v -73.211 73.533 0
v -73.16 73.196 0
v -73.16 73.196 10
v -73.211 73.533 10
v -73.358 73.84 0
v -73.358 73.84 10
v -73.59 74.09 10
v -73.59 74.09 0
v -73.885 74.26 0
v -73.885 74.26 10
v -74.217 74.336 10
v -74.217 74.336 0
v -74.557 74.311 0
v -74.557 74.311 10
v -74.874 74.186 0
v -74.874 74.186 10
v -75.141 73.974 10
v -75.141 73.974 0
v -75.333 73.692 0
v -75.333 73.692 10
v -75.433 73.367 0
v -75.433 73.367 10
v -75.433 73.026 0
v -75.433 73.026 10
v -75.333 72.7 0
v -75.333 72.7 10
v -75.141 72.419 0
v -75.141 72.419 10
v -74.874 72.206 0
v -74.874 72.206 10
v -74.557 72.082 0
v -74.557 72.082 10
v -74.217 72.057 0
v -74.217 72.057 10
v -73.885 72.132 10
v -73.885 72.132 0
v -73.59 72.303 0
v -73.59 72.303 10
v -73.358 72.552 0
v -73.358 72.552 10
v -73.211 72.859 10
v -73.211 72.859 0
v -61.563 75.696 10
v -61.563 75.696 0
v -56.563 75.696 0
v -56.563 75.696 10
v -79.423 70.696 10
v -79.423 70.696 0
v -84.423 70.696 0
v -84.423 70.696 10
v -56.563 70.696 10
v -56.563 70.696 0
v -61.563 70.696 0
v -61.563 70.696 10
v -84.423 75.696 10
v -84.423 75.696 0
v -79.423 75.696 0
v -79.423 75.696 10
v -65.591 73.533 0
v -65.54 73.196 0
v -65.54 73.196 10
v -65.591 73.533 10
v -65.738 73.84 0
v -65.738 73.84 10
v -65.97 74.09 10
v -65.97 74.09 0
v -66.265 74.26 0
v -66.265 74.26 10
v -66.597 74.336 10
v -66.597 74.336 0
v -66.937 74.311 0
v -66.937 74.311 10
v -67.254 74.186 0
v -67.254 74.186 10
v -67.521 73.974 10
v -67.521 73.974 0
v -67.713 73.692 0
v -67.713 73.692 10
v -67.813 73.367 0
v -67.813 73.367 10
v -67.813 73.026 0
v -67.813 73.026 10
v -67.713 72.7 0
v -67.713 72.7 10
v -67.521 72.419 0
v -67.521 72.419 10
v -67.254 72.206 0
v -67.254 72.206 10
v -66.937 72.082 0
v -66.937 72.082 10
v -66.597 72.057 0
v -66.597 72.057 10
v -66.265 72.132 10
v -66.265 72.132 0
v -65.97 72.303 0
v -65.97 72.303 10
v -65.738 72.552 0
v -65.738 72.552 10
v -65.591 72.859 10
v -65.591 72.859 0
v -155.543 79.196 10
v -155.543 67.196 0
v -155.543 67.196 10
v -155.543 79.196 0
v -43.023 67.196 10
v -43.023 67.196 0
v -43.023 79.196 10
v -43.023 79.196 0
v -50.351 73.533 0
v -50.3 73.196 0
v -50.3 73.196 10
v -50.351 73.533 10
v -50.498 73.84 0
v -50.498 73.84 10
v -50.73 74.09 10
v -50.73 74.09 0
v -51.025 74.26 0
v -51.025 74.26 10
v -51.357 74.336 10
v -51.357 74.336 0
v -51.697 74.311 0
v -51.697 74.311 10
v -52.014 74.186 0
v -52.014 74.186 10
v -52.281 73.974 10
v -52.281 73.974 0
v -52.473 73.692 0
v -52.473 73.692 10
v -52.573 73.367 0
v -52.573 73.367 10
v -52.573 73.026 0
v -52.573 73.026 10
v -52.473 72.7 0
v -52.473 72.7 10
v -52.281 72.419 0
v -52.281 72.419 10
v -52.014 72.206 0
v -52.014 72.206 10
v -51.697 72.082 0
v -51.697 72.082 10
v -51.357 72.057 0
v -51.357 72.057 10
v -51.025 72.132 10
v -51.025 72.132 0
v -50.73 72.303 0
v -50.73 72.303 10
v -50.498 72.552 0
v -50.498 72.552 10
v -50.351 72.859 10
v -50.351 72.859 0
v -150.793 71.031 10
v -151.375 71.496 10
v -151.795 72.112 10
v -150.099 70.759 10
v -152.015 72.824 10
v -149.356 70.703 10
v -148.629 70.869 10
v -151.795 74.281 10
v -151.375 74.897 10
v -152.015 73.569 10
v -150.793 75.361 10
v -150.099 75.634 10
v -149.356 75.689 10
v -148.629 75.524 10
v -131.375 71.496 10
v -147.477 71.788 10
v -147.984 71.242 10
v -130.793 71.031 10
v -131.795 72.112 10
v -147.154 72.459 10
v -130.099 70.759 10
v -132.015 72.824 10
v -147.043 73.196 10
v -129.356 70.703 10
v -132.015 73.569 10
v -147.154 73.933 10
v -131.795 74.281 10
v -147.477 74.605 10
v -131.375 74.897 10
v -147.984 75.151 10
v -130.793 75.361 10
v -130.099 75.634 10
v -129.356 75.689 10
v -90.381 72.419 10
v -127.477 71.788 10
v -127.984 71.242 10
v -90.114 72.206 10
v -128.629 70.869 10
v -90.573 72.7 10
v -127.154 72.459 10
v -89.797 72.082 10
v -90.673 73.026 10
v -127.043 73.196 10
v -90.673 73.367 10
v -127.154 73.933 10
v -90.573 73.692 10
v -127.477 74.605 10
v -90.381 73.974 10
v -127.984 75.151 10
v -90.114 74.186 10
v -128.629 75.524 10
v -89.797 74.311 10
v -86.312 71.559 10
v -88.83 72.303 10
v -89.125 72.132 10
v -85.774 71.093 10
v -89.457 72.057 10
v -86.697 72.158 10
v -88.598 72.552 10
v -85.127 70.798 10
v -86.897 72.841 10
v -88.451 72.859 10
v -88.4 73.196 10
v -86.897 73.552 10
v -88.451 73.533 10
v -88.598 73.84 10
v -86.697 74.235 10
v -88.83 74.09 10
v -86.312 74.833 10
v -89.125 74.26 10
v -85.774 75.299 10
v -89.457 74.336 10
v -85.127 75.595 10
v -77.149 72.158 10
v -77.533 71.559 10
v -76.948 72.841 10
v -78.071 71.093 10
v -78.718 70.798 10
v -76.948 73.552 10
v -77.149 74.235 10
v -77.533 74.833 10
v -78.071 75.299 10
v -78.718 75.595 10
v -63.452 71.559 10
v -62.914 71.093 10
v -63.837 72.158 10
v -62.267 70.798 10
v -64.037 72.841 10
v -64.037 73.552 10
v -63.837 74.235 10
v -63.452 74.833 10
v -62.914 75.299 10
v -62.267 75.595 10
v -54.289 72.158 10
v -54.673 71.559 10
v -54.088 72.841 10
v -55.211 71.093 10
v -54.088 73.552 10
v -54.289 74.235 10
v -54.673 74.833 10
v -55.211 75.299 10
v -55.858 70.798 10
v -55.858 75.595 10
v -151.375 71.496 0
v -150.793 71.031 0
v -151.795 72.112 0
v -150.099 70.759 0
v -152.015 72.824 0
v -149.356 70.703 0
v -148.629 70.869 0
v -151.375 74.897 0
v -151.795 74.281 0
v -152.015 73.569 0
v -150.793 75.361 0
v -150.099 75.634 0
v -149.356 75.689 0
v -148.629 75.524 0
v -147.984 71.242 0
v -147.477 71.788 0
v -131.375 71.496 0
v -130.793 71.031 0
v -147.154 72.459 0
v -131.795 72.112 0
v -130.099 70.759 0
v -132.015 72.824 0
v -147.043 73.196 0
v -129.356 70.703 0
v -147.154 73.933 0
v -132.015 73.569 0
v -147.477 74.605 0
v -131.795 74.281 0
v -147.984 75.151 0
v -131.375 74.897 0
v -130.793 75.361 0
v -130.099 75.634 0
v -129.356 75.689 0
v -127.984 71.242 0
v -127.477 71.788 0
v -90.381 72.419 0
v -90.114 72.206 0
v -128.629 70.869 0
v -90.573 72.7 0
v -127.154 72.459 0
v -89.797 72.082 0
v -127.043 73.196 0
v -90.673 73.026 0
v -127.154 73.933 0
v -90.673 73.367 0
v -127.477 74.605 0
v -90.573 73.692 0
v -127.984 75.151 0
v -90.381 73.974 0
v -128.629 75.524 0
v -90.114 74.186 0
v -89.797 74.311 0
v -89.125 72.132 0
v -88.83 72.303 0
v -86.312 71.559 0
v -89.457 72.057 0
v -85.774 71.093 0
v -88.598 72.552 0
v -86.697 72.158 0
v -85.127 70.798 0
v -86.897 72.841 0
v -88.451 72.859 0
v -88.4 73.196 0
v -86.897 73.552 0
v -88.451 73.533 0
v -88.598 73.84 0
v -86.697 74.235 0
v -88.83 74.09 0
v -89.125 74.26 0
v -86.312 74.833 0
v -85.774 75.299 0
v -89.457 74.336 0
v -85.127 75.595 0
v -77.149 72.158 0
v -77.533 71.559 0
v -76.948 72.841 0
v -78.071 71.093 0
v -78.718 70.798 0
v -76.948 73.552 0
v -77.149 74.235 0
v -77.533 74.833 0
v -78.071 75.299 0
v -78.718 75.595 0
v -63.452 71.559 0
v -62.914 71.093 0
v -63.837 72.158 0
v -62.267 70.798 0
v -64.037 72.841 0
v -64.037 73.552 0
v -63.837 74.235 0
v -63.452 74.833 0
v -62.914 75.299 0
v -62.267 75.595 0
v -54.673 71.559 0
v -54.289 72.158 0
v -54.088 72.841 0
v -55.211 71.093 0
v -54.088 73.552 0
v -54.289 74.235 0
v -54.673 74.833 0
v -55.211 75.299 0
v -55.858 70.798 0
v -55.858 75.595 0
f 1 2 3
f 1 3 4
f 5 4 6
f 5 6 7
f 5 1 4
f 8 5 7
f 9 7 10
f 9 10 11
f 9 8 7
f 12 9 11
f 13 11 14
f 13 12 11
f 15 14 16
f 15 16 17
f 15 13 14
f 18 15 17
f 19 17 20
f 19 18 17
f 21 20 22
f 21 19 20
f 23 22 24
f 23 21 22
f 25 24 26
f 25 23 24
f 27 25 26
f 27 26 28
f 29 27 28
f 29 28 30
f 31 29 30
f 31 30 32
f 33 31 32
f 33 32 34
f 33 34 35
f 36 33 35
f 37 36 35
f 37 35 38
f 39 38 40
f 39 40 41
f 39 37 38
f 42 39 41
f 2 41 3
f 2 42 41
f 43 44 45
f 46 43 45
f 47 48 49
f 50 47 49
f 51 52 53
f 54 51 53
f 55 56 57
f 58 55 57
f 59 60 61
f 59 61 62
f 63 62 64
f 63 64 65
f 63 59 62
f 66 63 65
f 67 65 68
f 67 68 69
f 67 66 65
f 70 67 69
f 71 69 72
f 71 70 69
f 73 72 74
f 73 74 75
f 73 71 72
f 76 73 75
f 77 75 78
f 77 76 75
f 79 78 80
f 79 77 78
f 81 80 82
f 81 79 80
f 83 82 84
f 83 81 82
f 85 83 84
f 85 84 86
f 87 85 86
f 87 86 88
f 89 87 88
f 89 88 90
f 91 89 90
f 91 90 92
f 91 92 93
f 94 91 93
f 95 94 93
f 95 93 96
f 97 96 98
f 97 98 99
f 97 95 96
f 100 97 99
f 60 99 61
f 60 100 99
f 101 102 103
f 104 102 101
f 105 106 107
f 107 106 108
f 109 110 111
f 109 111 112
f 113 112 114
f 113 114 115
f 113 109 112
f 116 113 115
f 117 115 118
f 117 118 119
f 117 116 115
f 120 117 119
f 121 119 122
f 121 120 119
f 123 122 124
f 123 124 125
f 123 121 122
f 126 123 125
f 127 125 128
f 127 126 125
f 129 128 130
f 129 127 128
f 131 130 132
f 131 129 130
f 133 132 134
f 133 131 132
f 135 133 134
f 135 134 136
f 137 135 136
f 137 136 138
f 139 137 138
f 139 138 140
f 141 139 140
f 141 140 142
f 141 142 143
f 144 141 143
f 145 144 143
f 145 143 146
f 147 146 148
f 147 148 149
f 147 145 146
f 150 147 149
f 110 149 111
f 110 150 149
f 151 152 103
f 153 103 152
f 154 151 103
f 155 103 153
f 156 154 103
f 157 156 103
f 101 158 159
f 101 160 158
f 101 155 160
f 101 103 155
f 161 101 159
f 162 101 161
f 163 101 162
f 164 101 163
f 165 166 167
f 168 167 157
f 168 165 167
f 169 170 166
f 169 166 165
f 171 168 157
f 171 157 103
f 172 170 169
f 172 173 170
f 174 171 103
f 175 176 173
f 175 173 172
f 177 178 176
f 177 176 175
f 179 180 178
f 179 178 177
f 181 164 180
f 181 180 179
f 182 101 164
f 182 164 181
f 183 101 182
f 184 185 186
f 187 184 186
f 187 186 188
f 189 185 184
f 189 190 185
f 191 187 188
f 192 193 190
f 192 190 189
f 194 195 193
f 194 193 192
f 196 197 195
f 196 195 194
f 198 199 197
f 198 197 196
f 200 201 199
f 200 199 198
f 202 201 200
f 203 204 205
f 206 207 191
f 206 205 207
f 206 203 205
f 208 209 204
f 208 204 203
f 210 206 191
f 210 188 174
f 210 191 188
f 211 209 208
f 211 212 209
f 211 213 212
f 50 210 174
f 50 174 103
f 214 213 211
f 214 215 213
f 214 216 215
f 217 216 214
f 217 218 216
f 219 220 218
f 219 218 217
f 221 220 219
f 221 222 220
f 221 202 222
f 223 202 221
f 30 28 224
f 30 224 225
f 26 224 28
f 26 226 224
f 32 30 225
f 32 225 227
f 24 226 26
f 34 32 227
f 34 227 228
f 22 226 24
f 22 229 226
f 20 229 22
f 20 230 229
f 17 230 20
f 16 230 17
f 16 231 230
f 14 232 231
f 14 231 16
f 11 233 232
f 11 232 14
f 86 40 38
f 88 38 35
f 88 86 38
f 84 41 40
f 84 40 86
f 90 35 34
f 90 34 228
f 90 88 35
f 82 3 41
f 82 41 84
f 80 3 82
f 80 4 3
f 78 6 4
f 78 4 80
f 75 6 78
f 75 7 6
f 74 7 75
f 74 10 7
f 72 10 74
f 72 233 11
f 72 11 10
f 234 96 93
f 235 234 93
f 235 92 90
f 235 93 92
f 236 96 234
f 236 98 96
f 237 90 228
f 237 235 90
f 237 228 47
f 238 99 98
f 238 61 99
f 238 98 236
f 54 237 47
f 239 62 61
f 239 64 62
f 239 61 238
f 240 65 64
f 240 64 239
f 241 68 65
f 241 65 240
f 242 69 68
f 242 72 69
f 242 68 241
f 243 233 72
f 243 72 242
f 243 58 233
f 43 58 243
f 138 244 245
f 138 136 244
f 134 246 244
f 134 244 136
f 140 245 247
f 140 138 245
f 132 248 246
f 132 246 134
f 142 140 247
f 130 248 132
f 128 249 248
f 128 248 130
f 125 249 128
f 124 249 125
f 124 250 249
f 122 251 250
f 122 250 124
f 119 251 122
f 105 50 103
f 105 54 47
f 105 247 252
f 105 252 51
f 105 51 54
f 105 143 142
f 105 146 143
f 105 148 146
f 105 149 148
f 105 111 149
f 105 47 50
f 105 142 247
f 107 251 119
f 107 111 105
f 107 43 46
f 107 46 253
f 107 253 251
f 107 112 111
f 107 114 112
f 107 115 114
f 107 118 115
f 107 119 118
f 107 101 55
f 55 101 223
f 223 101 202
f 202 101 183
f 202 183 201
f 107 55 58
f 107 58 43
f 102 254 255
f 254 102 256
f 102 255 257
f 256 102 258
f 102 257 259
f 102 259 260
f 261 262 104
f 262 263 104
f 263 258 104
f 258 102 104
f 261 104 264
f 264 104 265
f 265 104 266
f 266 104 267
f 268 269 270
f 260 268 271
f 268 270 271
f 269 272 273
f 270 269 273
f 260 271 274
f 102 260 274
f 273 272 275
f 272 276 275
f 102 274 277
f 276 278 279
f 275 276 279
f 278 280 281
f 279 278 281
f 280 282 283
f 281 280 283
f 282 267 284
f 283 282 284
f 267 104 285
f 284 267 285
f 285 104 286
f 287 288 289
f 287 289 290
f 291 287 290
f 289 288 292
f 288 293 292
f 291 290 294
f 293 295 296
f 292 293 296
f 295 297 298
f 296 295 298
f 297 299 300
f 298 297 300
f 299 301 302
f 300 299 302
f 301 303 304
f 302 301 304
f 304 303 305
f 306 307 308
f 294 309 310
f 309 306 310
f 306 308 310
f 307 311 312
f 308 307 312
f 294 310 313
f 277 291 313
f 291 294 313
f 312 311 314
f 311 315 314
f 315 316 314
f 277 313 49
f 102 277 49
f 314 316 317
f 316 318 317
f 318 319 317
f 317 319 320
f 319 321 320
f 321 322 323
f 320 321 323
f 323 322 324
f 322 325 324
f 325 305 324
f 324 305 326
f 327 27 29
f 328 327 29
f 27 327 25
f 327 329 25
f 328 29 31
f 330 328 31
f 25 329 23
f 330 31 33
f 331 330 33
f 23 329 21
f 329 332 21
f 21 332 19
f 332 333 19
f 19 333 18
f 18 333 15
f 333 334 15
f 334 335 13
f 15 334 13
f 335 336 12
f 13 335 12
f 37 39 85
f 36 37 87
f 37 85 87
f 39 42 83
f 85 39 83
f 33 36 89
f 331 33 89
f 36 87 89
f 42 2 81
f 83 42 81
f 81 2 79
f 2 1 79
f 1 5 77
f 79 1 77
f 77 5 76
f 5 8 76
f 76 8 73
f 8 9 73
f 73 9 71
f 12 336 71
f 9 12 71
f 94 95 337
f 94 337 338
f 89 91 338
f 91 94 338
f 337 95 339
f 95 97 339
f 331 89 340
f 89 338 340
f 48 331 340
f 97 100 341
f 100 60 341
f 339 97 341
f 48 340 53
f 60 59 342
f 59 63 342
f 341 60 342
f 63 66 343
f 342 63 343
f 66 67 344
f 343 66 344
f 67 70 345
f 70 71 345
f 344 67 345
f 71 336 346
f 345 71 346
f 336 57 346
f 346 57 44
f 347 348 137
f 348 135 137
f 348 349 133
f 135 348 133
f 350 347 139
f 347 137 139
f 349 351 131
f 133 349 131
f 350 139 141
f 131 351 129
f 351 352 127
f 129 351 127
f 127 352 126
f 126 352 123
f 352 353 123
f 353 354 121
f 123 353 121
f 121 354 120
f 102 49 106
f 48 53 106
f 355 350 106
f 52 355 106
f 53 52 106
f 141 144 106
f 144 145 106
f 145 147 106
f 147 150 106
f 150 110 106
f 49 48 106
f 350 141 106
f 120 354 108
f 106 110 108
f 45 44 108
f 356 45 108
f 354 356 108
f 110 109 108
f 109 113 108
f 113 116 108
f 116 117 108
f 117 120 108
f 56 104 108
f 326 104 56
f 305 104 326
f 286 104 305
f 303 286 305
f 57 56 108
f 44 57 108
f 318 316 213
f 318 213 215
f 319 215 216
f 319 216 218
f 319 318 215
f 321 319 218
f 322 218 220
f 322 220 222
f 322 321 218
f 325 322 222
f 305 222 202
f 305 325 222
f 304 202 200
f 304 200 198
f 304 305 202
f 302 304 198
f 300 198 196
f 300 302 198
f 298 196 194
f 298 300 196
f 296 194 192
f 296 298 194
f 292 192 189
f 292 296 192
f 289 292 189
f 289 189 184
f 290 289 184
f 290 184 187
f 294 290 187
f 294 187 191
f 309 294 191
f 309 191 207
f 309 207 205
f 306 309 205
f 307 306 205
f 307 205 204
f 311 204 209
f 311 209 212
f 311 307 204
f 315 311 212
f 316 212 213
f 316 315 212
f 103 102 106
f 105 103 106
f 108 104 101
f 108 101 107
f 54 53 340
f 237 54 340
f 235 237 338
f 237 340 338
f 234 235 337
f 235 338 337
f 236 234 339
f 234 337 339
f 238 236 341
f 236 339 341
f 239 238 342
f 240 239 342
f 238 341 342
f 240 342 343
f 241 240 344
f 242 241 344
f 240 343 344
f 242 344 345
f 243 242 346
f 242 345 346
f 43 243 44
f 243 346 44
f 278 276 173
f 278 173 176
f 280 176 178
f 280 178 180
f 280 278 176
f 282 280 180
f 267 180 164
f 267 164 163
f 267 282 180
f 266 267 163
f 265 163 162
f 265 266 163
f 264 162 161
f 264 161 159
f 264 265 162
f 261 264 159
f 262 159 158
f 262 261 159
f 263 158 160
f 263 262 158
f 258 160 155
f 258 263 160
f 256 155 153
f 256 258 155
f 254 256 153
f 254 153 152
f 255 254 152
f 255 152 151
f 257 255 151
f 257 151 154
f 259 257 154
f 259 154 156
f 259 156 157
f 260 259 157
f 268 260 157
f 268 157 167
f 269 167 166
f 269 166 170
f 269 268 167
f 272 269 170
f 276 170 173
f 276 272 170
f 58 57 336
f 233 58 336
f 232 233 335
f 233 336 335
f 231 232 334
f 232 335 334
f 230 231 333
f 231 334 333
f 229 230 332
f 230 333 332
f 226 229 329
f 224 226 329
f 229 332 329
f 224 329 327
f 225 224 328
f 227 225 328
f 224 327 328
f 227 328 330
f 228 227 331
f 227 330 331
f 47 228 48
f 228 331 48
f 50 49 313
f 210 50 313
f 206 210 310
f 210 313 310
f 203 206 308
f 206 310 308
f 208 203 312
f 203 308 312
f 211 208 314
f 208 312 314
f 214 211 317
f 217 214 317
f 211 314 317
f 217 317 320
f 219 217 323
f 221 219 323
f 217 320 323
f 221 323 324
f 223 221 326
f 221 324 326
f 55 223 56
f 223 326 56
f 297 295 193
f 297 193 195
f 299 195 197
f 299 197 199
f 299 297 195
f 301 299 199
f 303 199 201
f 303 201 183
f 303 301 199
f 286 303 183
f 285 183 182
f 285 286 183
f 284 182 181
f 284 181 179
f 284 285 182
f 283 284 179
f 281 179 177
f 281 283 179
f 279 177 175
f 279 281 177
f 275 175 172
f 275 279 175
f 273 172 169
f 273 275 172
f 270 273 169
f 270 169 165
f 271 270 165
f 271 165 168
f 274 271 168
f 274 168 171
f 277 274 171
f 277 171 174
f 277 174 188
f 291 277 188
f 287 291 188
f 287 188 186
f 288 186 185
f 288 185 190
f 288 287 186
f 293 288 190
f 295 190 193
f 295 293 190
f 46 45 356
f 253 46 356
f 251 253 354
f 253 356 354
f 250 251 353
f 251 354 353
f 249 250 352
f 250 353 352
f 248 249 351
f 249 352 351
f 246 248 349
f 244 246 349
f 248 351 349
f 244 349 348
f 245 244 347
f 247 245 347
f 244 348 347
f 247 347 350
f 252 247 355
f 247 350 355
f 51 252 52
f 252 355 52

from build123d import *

# Parameters (mm, degrees)
SKETCH1_W           = 112.520086359
SKETCH1_H           = 12
SKETCH1_R           = 2.5
SKETCH1_R_2         = 1.143
BOSS_EXTRUDE1_DEPTH = 10


with BuildPart() as part:
    # Sketch1 → Boss-Extrude1 (new body)
    with BuildSketch(Plane.XY):
        with Locations((-99.282747956, 73.19632446)):
            Rectangle(SKETCH1_W, SKETCH1_H)
        with Locations((-149.542791135, 73.19632446)):
            Circle(SKETCH1_R, mode=Mode.SUBTRACT)
        with Locations((-129.542791135, 73.19632446)):
            Circle(SKETCH1_R, mode=Mode.SUBTRACT)
        with Locations((-89.542791135, 73.19632446)):
            Circle(SKETCH1_R_2, mode=Mode.SUBTRACT)
        with Locations((-74.302791135, 73.19632446)):
            Circle(SKETCH1_R_2, mode=Mode.SUBTRACT)
        with Locations((-66.682791135, 73.19632446)):
            Circle(SKETCH1_R_2, mode=Mode.SUBTRACT)
        with Locations((-51.442791135, 73.19632446)):
            Circle(SKETCH1_R_2, mode=Mode.SUBTRACT)
        with BuildLine():
            Line((-84.422791135, 75.69632446), (-79.422791135, 75.69632446))
            ThreePointArc((-79.422791135, 75.69632446), (-76.922791135, 73.19632446), (-79.422791135, 70.69632446))
            Line((-79.422791135, 70.69632446), (-84.422791135, 70.69632446))
            ThreePointArc((-84.422791135, 70.69632446), (-86.922791135, 73.19632446), (-84.422791135, 75.69632446))
        make_face(mode=Mode.SUBTRACT)
        with BuildLine():
            Line((-61.562791135, 75.69632446), (-56.562791135, 75.69632446))
            ThreePointArc((-56.562791135, 75.69632446), (-54.062791135, 73.19632446), (-56.562791135, 70.69632446))
            Line((-56.562791135, 70.69632446), (-61.562791135, 70.69632446))
            ThreePointArc((-61.562791135, 70.69632446), (-64.062791135, 73.19632446), (-61.562791135, 75.69632446))
        make_face(mode=Mode.SUBTRACT)
    extrude(amount=BOSS_EXTRUDE1_DEPTH)


solid = part.part
